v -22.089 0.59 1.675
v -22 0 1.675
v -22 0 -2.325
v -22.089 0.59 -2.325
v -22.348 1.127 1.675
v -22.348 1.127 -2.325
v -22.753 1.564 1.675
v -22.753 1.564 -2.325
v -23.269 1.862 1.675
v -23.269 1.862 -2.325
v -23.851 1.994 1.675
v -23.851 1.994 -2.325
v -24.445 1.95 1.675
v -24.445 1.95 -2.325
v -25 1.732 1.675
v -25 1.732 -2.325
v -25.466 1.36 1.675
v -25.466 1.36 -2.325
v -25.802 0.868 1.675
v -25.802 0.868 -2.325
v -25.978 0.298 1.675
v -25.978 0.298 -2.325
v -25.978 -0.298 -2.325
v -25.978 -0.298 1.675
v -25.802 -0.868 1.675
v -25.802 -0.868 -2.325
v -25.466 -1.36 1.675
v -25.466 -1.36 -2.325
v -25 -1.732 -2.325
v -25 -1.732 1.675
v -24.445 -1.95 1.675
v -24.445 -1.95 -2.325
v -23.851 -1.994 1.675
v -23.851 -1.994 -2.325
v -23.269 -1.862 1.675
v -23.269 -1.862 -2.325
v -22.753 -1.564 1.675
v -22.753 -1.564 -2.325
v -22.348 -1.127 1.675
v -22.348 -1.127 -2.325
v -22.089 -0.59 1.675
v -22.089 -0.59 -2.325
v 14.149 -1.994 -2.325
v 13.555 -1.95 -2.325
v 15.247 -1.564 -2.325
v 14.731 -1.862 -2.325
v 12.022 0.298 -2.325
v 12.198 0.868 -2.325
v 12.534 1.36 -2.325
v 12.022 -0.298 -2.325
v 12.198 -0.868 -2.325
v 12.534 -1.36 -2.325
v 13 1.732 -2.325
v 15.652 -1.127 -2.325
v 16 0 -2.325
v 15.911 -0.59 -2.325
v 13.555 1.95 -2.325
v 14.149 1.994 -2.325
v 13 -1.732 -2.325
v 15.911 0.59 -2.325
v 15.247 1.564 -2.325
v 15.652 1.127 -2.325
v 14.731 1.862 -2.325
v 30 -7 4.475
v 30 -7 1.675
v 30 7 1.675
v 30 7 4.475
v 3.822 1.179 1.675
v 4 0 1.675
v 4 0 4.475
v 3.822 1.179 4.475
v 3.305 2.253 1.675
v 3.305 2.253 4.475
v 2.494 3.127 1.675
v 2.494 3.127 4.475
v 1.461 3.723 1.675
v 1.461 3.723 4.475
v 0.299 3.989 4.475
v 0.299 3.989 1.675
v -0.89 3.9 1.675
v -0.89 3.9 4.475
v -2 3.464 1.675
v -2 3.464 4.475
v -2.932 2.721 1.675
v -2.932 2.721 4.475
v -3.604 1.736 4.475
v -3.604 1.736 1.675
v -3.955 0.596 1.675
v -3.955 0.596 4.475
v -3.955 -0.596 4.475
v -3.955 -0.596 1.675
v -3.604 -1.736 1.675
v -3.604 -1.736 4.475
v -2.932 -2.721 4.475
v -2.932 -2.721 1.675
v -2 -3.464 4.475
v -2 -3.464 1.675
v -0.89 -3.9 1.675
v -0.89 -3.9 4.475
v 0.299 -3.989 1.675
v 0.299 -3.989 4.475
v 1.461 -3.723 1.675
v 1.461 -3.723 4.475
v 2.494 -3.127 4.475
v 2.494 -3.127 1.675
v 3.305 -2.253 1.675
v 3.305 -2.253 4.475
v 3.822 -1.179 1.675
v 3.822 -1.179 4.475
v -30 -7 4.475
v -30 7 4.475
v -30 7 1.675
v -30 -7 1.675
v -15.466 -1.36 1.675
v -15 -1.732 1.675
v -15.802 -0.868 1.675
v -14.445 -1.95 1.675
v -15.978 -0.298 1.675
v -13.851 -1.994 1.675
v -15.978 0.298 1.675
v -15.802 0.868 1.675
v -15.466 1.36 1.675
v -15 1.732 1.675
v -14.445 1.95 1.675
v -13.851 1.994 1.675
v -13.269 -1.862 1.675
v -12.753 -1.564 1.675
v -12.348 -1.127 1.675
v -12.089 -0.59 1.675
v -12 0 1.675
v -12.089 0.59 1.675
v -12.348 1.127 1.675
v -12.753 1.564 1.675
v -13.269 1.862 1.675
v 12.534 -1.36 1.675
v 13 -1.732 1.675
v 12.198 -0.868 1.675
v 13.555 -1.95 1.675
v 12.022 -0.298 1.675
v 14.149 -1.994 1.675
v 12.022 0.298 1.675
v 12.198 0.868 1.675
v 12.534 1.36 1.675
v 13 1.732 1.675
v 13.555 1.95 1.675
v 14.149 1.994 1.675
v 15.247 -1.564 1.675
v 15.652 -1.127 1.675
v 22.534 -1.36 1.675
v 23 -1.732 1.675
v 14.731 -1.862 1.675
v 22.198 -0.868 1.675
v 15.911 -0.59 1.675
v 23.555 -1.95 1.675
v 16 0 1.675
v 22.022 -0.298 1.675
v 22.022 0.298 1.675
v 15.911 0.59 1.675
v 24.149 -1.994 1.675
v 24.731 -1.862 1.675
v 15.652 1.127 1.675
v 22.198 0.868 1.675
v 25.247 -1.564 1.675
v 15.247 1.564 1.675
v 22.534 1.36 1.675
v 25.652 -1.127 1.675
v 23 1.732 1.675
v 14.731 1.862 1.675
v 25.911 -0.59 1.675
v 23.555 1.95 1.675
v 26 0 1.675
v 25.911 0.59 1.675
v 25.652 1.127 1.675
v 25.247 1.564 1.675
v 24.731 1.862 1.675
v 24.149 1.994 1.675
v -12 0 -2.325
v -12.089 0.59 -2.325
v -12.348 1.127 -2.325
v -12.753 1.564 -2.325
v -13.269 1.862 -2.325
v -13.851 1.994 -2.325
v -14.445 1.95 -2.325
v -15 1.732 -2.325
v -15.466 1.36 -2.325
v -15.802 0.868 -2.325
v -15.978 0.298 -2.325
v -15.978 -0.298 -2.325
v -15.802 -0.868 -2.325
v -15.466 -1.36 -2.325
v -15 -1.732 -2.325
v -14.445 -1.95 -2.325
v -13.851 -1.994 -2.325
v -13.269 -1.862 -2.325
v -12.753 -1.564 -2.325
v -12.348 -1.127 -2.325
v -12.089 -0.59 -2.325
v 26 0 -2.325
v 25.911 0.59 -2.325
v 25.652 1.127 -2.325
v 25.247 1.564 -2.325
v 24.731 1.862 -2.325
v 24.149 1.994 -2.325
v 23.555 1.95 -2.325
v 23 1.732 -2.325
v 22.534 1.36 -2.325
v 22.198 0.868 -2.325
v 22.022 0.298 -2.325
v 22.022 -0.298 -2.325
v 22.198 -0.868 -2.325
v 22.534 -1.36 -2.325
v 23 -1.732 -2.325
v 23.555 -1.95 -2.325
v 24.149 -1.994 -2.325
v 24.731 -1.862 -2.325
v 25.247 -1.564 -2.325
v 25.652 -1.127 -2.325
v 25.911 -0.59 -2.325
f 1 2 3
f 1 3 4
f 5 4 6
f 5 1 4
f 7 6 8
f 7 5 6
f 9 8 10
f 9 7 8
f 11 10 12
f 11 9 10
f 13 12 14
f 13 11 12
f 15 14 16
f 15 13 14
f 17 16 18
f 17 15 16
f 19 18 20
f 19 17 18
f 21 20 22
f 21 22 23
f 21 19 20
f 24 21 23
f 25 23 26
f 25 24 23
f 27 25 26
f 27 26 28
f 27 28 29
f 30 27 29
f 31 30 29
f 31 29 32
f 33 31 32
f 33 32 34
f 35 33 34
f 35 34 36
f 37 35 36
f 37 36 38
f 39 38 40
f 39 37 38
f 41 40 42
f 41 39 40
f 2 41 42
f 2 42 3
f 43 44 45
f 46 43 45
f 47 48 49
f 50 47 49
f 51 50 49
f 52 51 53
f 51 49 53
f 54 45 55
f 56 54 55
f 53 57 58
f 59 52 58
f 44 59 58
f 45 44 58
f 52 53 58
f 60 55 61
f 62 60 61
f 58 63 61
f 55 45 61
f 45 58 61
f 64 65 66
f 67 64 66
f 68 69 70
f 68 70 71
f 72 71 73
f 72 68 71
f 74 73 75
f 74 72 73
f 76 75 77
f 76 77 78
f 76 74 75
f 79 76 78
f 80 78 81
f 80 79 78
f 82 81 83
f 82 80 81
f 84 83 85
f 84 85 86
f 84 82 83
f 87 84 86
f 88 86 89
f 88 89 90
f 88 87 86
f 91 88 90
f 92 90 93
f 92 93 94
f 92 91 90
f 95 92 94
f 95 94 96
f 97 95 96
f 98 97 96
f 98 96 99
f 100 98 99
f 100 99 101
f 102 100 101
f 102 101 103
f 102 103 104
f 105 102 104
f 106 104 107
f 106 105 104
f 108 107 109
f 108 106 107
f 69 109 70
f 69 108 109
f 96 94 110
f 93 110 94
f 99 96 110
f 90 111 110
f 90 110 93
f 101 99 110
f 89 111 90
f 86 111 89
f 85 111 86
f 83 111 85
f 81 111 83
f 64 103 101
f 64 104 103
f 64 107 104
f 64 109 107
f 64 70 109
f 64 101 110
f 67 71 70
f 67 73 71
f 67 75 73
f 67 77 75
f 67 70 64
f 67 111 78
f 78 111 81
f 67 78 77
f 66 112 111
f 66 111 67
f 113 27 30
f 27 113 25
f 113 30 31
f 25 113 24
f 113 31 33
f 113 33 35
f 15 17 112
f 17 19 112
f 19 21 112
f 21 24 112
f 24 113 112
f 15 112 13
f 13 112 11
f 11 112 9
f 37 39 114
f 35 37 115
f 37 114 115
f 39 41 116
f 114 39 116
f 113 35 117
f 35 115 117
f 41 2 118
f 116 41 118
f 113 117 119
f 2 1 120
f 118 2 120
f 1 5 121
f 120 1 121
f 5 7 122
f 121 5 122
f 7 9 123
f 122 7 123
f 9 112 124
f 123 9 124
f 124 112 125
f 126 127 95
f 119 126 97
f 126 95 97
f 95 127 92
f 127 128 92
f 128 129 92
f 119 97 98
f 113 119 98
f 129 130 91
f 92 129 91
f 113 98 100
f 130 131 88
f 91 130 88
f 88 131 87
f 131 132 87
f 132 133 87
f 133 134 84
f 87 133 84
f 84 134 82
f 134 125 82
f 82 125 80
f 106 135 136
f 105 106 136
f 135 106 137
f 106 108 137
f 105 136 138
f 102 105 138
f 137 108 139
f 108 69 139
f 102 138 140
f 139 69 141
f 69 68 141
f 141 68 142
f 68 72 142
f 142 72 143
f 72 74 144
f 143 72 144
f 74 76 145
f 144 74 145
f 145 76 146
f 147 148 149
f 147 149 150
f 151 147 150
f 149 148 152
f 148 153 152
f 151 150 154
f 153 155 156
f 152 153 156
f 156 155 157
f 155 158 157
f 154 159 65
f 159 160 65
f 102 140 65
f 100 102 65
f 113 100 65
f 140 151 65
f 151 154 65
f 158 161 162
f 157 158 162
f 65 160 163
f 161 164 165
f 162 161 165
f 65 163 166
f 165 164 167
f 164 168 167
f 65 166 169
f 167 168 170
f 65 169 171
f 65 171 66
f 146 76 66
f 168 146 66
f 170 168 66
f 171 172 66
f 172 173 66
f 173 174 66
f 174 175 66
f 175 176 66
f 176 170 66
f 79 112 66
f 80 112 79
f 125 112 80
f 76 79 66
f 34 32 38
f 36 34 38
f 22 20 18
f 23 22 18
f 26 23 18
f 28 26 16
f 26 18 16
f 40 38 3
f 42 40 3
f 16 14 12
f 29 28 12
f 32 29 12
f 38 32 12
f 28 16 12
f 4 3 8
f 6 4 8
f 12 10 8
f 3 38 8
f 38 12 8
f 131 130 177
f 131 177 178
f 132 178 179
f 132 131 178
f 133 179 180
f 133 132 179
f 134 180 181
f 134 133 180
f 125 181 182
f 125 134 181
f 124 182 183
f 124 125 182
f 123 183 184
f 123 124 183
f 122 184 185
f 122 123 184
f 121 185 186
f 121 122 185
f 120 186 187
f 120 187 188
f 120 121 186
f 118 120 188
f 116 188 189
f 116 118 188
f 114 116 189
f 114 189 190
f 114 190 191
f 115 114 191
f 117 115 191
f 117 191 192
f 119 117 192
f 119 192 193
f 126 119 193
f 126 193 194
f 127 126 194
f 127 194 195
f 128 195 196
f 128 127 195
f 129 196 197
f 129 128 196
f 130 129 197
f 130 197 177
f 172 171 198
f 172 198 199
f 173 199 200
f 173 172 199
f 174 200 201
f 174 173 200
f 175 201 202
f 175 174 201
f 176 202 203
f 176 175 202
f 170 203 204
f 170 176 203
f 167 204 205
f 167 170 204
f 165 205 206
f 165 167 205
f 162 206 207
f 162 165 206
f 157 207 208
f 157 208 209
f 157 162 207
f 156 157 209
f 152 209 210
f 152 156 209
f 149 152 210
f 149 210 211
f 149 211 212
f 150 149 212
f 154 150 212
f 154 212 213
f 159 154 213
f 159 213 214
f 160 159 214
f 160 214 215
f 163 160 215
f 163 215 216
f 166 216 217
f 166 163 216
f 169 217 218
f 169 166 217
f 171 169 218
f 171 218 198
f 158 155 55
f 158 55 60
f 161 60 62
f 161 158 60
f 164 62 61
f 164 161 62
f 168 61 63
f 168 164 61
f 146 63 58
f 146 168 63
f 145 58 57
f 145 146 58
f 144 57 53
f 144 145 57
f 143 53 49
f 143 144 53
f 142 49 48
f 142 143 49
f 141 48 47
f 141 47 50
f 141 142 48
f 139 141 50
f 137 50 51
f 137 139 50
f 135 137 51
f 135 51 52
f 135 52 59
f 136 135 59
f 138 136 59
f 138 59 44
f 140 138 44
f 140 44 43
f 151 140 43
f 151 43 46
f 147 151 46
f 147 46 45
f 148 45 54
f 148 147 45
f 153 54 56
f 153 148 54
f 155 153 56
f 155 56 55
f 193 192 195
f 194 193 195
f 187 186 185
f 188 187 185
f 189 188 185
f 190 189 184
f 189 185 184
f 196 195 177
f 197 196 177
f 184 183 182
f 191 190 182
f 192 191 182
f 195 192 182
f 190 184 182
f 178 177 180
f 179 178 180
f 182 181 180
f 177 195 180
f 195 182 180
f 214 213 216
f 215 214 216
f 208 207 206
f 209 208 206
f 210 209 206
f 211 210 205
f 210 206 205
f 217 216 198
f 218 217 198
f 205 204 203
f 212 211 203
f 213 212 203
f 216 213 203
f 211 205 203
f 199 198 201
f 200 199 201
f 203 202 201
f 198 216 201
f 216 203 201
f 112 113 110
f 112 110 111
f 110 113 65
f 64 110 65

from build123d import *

# Parameters (mm, degrees)
SKETCH1_W           = 150
SKETCH1_H           = 35
SKETCH1_R           = 10
BOSS_EXTRUDE1_DEPTH = 7
SKETCH1_3_R         = 5
BOSS_EXTRUDE2_DEPTH = 10
SCALE1_SCALE        = 0.2
SCALE2_SCALE        = 2


with BuildPart() as part:
    # Sketch1 → Boss-Extrude1 (new body)
    with BuildSketch(Plane.XY):
        Rectangle(SKETCH1_W, SKETCH1_H)
        Circle(SKETCH1_R, mode=Mode.SUBTRACT)
    extrude(amount=BOSS_EXTRUDE1_DEPTH)

    # Sketch1<3> → Boss-Extrude2 (add)
    with BuildSketch(Plane.XY):
        with Locations((60, 0)):
            Circle(SKETCH1_3_R)
        with Locations((35, 0)):
            Circle(SKETCH1_3_R)
        with Locations((-35, 0)):
            Circle(SKETCH1_3_R)
        with Locations((-60, 0)):
            Circle(SKETCH1_3_R)
    extrude(amount=-BOSS_EXTRUDE2_DEPTH)


with BuildPart() as part_1:
    # Scale1: scaled about (0, 0, 2.791541997)
    add(part.part.scale(SCALE1_SCALE).moved(Location((0, 0, 2.233233598))))


with BuildPart() as part_2:
    # Scale2: scaled about (0, 0, 2.791541997)
    add(part_1.part.scale(SCALE2_SCALE).moved(Location((0, 0, -2.791541997))))


solid = part_2.part
